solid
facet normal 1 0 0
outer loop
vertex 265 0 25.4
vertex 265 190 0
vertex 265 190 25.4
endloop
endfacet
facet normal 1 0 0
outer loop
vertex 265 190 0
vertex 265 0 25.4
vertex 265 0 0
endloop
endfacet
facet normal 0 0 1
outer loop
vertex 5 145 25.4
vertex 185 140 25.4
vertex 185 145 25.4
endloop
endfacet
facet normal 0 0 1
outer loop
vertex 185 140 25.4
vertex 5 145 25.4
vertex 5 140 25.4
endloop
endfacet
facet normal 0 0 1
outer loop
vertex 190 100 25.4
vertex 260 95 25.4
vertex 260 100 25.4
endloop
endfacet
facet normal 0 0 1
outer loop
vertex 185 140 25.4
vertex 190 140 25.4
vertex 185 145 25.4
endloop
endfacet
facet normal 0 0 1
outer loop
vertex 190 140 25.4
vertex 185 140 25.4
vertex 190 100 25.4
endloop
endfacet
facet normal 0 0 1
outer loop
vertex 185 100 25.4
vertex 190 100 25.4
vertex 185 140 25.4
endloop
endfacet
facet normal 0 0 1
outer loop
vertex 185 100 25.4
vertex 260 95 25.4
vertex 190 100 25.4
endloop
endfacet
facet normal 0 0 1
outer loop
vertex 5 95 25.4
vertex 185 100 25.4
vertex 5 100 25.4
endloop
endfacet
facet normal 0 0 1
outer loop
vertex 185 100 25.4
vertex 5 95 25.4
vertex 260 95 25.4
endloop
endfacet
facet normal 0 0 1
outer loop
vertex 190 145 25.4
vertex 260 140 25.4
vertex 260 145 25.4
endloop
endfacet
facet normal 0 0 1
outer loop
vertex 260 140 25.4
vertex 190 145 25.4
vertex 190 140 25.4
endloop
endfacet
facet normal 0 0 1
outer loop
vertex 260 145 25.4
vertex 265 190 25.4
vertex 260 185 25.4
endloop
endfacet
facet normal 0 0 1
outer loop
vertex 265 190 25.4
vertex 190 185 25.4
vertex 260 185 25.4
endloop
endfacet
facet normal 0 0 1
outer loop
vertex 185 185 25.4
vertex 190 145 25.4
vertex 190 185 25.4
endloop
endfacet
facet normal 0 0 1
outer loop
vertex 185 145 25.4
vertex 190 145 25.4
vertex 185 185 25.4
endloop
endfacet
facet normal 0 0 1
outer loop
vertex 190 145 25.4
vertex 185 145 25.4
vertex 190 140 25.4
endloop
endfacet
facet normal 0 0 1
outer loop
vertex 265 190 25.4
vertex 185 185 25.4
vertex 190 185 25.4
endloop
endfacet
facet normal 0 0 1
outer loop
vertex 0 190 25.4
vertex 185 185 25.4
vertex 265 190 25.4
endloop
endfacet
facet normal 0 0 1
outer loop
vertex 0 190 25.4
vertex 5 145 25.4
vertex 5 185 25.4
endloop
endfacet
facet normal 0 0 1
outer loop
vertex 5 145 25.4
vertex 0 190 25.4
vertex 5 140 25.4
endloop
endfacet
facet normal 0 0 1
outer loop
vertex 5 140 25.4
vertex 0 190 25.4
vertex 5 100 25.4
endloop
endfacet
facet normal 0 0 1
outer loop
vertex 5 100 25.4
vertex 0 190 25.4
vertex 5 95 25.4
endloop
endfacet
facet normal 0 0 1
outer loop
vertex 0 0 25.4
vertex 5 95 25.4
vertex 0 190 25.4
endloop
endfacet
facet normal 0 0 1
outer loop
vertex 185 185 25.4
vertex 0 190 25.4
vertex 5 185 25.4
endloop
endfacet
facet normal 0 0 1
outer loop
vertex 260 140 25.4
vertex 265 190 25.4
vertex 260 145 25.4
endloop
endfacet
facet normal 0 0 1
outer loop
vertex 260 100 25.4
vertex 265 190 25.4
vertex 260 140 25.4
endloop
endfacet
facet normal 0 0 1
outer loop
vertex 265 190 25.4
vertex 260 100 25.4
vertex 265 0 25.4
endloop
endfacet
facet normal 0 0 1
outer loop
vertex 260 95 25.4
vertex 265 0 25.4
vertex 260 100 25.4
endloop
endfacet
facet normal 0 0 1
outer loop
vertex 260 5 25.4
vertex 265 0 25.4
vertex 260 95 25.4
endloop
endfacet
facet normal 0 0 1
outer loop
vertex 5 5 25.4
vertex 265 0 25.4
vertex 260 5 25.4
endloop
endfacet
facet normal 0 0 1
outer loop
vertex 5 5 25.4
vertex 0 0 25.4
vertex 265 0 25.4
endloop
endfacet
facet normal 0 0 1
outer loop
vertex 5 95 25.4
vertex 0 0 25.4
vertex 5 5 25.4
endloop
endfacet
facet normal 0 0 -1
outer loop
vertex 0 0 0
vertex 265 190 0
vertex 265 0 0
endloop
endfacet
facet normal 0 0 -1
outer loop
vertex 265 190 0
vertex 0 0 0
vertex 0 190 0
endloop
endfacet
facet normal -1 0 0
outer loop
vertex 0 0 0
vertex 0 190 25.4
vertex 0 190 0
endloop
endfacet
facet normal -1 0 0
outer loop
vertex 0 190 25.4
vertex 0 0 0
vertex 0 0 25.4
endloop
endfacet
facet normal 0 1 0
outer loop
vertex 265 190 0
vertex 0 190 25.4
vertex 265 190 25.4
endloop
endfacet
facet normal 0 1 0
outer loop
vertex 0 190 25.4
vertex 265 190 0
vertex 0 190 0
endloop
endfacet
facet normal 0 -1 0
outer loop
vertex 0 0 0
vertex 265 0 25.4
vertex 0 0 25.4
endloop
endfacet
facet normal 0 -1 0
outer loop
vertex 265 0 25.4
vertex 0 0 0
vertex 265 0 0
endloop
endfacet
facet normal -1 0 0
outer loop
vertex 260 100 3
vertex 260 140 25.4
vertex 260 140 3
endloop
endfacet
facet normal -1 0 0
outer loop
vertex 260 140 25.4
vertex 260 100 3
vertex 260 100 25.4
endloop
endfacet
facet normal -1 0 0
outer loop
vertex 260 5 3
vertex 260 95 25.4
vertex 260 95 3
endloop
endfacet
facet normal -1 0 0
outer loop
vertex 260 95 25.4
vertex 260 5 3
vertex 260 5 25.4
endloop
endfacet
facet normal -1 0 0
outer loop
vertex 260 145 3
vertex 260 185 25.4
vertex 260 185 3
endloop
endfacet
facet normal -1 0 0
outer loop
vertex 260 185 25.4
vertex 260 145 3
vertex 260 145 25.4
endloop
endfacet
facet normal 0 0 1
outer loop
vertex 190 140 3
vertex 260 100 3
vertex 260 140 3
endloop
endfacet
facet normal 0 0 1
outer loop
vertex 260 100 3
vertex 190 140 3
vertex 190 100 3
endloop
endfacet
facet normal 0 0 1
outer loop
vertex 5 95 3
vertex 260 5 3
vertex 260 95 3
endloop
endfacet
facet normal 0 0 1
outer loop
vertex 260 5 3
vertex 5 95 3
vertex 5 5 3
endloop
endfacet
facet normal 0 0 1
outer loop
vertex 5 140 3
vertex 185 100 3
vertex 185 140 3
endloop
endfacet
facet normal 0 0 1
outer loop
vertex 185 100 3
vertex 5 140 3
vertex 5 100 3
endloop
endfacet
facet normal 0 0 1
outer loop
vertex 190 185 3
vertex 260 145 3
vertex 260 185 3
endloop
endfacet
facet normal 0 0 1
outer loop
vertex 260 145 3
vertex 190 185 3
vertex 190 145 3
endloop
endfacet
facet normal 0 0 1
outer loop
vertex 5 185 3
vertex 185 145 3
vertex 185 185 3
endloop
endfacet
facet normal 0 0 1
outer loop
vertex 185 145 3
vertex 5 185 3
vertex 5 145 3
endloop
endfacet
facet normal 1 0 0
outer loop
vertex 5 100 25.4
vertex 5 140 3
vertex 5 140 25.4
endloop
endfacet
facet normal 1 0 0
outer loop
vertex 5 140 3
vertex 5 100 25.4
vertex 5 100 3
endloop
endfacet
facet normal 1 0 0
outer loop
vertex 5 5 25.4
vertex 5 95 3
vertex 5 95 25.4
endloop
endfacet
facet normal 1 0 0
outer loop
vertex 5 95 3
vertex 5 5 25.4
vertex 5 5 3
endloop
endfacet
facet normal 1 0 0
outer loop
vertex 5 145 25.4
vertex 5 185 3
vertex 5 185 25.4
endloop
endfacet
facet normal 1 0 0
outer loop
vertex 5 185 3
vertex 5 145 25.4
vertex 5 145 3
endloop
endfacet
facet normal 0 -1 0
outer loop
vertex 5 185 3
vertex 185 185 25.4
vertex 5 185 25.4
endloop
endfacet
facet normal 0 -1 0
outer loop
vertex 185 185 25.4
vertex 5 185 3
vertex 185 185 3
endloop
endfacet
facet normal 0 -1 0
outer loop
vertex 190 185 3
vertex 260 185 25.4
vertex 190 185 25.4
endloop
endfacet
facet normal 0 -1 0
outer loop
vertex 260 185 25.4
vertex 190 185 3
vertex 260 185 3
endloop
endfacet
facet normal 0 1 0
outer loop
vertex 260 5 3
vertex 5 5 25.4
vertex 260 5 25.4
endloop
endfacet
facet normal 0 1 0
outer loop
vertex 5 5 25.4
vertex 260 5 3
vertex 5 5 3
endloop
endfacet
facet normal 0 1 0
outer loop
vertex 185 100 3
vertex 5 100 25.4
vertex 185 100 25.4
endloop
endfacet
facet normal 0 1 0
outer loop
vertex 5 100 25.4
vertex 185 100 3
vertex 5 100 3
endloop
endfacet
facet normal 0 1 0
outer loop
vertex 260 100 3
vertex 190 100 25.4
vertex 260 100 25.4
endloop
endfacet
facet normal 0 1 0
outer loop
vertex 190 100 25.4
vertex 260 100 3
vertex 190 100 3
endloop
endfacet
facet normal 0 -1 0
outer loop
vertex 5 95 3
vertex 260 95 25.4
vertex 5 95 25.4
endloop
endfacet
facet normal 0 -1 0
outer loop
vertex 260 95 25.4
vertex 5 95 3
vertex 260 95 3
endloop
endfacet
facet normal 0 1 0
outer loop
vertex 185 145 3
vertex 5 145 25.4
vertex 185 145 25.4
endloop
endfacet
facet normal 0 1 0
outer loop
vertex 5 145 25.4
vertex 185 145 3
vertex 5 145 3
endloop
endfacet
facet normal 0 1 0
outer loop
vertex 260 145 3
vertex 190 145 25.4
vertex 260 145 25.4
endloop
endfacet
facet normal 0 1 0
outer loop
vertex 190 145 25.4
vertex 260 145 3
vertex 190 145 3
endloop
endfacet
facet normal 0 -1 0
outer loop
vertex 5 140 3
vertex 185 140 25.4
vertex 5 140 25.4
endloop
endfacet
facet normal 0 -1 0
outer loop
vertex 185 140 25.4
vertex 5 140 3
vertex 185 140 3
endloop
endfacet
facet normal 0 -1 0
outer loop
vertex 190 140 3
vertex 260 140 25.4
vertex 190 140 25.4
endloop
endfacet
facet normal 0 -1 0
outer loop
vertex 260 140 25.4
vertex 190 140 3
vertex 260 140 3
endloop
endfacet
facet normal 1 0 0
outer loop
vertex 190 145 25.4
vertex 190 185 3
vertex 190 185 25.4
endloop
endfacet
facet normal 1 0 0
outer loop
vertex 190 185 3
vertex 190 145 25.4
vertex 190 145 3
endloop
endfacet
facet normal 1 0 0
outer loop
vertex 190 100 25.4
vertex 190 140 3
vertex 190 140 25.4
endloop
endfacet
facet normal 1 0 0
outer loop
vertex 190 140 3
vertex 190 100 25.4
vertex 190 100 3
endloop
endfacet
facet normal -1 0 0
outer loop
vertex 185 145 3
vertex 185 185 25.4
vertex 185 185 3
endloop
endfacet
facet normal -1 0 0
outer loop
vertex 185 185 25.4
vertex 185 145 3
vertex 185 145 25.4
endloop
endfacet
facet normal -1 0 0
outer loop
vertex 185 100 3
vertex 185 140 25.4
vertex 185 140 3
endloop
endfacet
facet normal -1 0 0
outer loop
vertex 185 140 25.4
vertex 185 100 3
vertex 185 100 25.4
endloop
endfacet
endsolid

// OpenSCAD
// Victorian Watercolor Box — Top Tray
// Millimeters

wall = 5;
floor = 3;
height = 25.4;

// Interior dimensions
left = 180;
right = 70;
top = 40;
middle = 40;
bottom = 90;

width = left + right + 3*wall;      // 265
length = top + middle + bottom + 4*wall; // 190

difference() {
    cube([width, length, height]);

    translate([wall, wall, floor])
        cube([width-2*wall, length-2*wall, height]);
}

// Horizontal dividers
for (y = [bottom+wall, bottom+middle+2*wall])
    translate([wall, y, floor])
        cube([width-2*wall, wall, height-floor]);

// Vertical divider (top two rows only)
translate([left+wall, bottom+2*wall, floor])
    cube([wall, top+middle+wall, height-floor]);
